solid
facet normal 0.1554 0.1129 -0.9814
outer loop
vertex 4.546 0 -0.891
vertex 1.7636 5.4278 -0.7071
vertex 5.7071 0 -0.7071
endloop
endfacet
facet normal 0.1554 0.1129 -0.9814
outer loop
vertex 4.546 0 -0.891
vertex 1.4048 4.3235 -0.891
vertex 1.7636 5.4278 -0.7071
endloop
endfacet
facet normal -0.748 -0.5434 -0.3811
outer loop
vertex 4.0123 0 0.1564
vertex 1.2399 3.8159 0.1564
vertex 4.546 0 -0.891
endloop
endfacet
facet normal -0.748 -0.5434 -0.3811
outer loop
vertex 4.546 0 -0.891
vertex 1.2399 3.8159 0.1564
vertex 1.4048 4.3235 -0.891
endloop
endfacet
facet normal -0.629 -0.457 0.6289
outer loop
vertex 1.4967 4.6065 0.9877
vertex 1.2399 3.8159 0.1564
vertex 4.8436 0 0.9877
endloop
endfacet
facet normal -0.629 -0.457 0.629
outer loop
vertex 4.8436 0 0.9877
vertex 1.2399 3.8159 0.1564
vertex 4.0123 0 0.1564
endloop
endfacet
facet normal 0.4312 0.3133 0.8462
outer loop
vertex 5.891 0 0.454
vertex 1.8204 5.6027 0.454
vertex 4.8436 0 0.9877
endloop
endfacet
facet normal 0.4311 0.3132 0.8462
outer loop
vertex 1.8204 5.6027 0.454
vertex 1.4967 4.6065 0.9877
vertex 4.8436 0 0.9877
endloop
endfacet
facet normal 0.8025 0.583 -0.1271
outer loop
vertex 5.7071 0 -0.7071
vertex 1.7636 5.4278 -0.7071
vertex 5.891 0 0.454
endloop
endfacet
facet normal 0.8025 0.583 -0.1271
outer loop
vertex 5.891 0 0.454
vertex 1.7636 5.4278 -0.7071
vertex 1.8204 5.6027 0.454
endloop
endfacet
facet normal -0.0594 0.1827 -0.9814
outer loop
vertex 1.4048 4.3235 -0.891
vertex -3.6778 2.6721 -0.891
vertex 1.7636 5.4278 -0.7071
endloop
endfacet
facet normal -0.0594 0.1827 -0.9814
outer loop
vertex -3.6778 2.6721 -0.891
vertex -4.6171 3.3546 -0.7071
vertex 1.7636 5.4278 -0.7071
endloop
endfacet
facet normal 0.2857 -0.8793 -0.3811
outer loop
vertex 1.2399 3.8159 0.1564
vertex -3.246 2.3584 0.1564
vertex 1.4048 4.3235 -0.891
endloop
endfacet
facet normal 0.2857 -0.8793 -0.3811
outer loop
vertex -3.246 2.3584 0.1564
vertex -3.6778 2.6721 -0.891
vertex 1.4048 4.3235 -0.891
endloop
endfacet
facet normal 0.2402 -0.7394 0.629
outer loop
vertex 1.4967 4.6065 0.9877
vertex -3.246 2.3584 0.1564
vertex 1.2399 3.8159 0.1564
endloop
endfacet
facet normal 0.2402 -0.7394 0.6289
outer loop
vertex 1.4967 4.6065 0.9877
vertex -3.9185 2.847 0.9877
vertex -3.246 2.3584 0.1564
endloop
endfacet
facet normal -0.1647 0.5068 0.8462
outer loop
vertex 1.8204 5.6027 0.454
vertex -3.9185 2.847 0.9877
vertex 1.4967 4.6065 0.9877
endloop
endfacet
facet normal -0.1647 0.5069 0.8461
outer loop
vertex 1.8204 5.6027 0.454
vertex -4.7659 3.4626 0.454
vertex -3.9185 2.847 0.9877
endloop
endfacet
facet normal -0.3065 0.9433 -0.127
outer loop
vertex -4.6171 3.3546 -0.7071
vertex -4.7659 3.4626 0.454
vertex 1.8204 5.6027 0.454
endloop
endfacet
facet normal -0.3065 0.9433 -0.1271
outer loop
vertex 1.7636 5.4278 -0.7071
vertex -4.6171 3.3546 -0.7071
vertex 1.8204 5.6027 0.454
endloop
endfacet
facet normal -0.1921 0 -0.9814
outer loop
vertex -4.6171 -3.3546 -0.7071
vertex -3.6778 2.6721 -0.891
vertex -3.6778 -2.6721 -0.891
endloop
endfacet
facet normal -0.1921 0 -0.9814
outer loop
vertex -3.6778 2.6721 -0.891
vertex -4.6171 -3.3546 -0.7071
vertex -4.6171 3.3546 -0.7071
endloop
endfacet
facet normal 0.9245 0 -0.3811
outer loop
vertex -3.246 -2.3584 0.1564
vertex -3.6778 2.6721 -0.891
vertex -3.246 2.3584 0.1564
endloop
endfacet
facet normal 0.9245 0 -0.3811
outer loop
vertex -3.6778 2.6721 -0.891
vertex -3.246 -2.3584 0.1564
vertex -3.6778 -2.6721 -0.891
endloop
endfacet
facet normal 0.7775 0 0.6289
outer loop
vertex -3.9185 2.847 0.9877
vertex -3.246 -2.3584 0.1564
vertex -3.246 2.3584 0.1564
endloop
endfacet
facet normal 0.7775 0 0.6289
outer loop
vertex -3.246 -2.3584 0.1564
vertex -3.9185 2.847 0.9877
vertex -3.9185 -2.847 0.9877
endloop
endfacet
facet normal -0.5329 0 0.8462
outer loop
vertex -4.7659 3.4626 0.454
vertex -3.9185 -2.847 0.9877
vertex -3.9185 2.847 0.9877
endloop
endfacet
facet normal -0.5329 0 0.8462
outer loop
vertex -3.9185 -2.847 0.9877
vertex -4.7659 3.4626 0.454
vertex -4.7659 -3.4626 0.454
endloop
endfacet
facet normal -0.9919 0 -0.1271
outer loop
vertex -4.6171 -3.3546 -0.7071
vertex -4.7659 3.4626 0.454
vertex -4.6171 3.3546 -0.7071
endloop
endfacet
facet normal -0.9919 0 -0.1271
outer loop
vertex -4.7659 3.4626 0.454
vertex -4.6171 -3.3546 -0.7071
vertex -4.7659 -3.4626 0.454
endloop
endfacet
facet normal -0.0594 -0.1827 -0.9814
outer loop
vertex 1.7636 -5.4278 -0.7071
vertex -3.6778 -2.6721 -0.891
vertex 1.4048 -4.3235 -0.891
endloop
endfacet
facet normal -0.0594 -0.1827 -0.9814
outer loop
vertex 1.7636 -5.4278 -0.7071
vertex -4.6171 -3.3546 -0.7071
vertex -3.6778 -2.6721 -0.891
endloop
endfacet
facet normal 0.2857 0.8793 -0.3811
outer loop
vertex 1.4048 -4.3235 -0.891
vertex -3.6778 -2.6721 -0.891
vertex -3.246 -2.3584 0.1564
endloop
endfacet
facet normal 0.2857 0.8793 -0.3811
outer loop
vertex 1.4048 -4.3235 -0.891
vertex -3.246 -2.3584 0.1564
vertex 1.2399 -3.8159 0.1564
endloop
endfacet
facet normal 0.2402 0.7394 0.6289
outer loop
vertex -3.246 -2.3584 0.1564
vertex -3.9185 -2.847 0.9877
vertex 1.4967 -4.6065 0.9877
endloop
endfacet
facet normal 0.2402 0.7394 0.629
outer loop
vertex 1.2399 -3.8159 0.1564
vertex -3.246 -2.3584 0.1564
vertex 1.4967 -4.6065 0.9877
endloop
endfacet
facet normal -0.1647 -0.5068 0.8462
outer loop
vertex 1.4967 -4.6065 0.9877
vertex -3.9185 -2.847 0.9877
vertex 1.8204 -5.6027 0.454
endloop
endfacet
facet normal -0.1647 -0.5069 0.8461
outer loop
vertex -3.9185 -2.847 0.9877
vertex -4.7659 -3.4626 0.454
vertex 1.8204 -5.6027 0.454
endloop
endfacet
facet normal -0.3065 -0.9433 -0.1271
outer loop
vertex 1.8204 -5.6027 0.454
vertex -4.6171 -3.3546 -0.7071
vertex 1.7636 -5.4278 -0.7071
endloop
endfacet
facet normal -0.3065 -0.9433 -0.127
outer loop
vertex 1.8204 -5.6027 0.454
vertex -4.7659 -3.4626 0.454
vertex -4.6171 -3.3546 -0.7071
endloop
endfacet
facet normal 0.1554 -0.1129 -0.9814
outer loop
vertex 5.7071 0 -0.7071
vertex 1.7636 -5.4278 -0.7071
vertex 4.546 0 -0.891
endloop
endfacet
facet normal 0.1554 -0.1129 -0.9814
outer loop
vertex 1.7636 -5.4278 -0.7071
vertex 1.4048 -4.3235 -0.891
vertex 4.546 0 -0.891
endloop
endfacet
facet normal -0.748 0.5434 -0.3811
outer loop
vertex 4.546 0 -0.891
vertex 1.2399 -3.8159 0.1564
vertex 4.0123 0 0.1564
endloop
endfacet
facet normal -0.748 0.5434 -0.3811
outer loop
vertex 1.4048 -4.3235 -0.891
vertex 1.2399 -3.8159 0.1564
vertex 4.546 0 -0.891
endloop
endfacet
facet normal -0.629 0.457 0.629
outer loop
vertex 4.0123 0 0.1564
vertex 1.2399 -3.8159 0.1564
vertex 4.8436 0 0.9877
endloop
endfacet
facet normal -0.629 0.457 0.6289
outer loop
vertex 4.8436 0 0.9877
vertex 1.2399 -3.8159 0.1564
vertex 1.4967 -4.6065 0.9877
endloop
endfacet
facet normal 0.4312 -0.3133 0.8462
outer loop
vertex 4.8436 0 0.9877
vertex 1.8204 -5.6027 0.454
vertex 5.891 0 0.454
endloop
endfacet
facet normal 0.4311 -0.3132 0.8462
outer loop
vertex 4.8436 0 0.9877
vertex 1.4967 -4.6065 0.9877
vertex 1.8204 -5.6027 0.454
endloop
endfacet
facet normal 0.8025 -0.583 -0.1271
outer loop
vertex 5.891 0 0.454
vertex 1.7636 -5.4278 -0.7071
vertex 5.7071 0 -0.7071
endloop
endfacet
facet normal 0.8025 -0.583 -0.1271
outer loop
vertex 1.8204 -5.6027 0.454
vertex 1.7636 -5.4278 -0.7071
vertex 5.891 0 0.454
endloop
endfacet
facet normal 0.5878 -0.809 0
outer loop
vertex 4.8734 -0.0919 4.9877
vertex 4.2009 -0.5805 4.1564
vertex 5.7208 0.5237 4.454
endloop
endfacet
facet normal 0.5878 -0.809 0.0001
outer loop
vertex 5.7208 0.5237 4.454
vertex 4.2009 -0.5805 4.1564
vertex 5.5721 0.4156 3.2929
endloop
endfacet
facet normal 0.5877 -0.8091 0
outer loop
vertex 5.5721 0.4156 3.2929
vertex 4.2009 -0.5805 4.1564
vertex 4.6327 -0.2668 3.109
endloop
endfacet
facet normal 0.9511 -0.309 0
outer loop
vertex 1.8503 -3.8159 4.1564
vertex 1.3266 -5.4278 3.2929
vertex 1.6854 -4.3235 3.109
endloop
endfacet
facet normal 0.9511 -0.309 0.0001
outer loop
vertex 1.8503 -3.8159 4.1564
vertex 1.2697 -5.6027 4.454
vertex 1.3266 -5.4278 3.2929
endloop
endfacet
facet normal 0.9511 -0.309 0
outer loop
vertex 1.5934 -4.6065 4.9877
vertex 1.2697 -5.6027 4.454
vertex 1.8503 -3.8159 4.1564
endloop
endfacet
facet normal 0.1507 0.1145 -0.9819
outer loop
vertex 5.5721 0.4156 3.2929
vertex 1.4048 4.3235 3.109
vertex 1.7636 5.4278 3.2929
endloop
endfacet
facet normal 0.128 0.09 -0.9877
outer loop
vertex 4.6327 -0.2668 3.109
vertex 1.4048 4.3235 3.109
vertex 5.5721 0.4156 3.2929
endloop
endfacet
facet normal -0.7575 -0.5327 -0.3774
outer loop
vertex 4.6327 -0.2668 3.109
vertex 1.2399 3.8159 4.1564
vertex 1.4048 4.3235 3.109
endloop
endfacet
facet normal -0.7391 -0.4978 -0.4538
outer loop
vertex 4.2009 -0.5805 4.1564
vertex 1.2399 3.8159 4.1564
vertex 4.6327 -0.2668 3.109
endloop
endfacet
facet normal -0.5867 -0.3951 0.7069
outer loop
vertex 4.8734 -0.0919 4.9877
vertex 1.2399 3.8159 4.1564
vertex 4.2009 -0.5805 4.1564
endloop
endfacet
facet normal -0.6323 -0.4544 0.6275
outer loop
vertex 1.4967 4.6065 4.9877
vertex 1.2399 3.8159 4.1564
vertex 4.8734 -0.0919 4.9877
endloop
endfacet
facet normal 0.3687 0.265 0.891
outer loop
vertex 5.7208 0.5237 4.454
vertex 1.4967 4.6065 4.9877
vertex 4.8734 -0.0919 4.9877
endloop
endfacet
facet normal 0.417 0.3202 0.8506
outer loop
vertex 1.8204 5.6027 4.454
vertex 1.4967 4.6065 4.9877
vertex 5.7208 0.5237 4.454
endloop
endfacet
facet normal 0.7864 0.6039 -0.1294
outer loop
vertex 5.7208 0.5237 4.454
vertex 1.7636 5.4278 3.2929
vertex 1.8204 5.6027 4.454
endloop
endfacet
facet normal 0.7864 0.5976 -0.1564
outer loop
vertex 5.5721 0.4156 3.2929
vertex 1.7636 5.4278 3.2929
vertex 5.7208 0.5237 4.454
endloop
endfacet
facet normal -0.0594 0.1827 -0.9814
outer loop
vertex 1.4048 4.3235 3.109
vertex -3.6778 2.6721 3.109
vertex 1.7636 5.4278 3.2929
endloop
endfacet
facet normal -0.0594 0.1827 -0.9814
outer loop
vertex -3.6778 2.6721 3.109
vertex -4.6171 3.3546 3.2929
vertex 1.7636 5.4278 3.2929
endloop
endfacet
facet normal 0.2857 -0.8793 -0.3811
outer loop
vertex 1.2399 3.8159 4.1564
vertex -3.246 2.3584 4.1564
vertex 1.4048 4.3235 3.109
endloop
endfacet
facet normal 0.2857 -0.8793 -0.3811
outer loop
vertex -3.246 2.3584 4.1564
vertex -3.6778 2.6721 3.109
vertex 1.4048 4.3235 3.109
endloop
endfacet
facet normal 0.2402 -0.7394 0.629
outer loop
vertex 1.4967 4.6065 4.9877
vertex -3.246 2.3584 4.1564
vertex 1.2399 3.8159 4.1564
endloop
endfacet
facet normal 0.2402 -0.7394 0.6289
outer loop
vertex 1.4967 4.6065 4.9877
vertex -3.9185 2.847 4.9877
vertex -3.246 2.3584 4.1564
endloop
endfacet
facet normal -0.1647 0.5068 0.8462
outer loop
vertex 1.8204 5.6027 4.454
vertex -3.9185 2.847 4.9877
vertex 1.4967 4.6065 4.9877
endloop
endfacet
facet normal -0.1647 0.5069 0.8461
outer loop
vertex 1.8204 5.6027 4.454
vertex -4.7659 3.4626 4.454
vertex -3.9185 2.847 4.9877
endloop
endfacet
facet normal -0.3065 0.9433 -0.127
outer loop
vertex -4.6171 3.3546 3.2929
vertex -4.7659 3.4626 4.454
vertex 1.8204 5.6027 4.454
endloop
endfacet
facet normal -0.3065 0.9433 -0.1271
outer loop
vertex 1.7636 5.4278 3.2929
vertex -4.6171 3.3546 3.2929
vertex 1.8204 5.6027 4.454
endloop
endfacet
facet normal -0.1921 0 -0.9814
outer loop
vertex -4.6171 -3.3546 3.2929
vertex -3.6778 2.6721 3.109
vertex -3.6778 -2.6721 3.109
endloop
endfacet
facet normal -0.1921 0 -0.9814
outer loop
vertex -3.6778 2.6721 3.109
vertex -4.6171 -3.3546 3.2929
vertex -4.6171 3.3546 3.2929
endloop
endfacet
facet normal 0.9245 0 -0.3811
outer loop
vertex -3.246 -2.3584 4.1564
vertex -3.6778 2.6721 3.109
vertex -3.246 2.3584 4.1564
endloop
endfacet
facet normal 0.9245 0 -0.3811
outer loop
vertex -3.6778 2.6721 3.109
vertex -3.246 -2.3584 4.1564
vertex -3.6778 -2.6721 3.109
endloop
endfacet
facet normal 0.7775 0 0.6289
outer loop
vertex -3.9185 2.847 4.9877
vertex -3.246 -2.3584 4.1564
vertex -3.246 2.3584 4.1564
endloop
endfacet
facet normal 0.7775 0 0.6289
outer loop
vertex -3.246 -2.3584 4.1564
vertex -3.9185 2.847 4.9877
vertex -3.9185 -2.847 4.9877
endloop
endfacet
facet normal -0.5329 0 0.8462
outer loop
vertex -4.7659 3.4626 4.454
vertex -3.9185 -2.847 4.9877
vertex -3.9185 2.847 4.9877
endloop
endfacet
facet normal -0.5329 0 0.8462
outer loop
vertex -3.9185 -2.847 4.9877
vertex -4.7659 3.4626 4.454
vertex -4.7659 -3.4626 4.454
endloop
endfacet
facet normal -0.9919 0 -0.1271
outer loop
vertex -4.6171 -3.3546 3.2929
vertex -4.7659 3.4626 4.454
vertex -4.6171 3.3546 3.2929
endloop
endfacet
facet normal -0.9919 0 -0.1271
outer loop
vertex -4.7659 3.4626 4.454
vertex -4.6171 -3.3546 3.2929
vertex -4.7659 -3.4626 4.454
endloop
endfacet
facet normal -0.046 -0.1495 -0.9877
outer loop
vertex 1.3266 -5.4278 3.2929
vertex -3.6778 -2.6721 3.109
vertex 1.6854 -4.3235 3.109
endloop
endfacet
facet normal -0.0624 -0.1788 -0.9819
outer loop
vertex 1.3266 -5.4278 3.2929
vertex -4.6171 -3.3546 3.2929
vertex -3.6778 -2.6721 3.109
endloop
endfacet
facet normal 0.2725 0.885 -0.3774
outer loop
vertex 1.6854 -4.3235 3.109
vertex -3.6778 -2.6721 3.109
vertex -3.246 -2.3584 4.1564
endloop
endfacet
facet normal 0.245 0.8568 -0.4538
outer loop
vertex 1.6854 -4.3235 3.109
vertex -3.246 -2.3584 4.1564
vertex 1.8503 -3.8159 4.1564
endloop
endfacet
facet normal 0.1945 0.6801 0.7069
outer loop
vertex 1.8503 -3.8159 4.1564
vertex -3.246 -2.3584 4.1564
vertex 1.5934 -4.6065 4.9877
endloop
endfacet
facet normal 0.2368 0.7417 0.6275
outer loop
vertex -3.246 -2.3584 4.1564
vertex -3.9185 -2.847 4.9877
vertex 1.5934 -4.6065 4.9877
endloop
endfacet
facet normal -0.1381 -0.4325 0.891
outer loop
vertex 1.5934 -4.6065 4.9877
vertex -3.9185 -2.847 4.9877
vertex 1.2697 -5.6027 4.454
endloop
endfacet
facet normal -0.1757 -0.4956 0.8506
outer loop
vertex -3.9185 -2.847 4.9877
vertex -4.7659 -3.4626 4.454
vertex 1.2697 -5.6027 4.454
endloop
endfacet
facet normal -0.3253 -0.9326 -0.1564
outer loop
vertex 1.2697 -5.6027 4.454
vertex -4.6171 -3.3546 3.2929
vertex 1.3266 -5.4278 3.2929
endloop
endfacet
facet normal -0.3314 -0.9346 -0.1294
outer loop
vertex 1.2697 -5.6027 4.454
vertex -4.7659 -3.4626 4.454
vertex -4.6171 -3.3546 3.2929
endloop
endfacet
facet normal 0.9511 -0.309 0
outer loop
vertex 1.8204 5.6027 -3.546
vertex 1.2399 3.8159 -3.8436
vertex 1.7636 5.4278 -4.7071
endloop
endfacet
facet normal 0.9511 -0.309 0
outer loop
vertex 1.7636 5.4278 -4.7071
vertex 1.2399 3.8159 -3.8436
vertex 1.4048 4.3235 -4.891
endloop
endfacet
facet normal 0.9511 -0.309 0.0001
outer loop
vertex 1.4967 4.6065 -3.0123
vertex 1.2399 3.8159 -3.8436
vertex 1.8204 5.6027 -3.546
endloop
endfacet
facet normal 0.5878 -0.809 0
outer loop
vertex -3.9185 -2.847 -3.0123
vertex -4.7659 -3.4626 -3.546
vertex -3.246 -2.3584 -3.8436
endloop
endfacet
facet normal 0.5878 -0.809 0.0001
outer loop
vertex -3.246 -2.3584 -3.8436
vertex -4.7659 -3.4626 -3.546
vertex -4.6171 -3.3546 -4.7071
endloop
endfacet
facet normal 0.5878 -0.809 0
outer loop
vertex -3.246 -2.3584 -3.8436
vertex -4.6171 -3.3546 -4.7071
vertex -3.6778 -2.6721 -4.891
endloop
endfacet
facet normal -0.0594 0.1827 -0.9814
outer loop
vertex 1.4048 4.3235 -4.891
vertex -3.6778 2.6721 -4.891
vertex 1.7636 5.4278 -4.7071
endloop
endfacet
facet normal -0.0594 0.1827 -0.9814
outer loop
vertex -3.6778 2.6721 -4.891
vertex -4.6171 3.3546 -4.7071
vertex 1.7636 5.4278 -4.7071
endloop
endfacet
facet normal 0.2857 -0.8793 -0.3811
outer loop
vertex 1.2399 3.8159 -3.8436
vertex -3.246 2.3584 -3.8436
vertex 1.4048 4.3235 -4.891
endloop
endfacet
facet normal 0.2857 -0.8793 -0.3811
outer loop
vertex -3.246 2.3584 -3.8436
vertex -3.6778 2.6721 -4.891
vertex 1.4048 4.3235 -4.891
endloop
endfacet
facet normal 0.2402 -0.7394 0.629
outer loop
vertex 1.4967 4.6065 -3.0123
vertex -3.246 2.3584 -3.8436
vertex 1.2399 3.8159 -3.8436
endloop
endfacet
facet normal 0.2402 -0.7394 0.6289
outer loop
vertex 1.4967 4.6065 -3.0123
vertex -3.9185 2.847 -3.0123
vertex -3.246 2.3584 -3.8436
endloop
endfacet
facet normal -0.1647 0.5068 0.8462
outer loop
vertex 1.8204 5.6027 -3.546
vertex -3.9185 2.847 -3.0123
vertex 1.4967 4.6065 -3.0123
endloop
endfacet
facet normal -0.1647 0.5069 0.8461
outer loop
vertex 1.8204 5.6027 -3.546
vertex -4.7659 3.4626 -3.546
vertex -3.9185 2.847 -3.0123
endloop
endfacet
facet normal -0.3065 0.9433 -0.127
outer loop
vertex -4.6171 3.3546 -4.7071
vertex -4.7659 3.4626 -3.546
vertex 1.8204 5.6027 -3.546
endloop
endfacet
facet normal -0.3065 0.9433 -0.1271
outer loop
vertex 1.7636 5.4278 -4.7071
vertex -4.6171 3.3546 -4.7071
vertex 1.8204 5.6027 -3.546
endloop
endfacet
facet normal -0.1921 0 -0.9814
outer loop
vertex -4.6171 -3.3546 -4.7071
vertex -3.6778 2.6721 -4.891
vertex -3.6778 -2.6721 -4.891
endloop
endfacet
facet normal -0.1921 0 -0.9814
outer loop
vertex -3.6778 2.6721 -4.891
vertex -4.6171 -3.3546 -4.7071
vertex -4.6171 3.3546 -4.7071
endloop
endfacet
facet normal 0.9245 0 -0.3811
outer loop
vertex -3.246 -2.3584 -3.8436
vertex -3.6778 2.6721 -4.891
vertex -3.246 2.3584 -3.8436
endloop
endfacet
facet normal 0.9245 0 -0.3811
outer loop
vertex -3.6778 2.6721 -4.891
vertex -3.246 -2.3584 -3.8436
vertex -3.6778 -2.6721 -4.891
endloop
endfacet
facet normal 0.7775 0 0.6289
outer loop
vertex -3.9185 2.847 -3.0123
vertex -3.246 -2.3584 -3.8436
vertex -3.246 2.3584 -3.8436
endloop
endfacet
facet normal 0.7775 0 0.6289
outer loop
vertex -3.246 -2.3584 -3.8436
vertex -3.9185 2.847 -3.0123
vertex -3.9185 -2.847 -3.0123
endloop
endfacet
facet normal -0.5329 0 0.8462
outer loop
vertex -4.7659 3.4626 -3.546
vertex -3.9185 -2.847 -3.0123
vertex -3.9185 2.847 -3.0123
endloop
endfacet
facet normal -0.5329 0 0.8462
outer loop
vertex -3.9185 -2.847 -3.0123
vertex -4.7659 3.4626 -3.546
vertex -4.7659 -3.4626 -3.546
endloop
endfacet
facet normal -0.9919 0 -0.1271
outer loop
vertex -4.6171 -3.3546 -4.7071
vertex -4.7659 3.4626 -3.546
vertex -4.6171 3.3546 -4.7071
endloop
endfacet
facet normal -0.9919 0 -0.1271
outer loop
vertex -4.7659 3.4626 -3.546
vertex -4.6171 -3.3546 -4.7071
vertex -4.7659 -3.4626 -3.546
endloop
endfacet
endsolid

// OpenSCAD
// rotation matrix implementation
// OpenSCAD seems to do this slightly different from Wikipedia
// c.f. https://en.wikipedia.org/wiki/Rotation_matrix#Basic_rotations
function rot2Mat(rotVec, axis) =
    (len(rotVec) == 2) ?
        rot2Mat([rotVec[0], rotVec[1], 0], axis) :
    (axis == "x") ?
        [[1,              0,               0],
         [0, cos(rotVec[0]),  sin(rotVec[0])],
         [0, sin(rotVec[0]), -cos(rotVec[0])]] :
    (axis == "y") ?
        [[ cos(rotVec[1]), 0, sin(rotVec[1])],
         [              0, 1,              0],
         [-sin(rotVec[1]), 0, cos(rotVec[1])]] :
    (axis == "z") ?
        [[ cos(rotVec[2]), sin(rotVec[2]), 0],
         [-sin(rotVec[2]), cos(rotVec[2]), 0],
         [0,              0,               1]] : undef;

// convert point to 3D by setting Z to zero (if not present)
function c3D(tPoints) = 
    (len(tPoints[0]) < 3) ?
        tPoints * [[1,0,0],[0,1,0]] :
        tPoints;

// rotate [2D] points using a specificed XYZ rotation vector
function myRotate(rotation, points) =
    c3D(points) * rot2Mat(rotation, "x")
           * rot2Mat(rotation, "y")
           * rot2Mat(rotation, "z");    
    
// Determine spherical rotation for cartesian coordinates
function rToS(pt) = 
    [-acos((pt[2]) / norm(pt)), 
	 0, 
	 -atan2(pt[0],pt[1])];

// Generate a line between two points in 3D space
module line3D(p1,p2){
  translate((p1+p2)/2)
    rotate(rToS(p1-p2))
       cylinder(r=1, h=norm(p1-p2), center = true, $fn = 3);
}

// Flattens an array down one level (removing the enclosing array)
function flatten(pointArray, done=0, res=[]) =
    (done == len(pointArray)) ?
        res :
        flatten(pointArray=pointArray, done=done+1, 
            res=concat(res,pointArray[done]));

// Creates a polyhedron face
function phFace(pp, tp, base, add=0) =
    [base + add, (base+1) % pp + add,
     (((base+1) % pp) + pp + add) % tp, (base + pp + add) % tp];

function add(vecArg, scArg, res=[]) = 
    (len(res) >= len(vecArg)) ?
        res :
        add(vecArg, scArg, res=concat(res,[vecArg[len(res)]+scArg]));

// Generate an extruded polyhedron from an array of points
// boolean argument "closed" indicates whether to close up the 
// start and end polygon
module makeExtrudedPoly(ex, merge=false, trimEnds=false){
    ps = flatten(ex);
    pp = len(ex[1]); // points in one polygon
    tp = len(ex[1]) * len(ex); // total number of points
    if(!merge && !trimEnds){
        polyhedron(points=ps, faces=concat(
            [[for (i = [pp-1  : -1 :    0]) i]],
            [[for (i = [tp-pp :  1 : tp-1]) i]],
            [for (pt=[0:(len(ex)-2)])
                for(i = [0:pp-1]) phFace(pp,tp,i,pt*pp)],
            [])
        );
    } else if(trimEnds) {
        polyhedron(points=ps, faces=concat(
            [[for (i = [pp*2-1  : -1 :    pp]) i]],
            [[for (i = [tp-pp*2 :  1 : tp-pp-1]) i]],
            [for (pt=[1:(len(ex)-3)])
                for(i = [0:pp-1]) phFace(pp,tp,i,pt*pp)]));
    } else {
        polyhedron(points=ps, faces=
            [for (pt=[0:(len(ex)-1)])
                for(i = [0:pp-1]) phFace(pp,tp,i,pt*pp)]);
    }
}

// Extrude polygon along a path
module path_extrude(points, path, pos=0, merge=false, trimEnds=false, doRotate=true,
                    doScale=false, extruded=[]){
    if((len(points) > 0) && (len(path) > 0) && (len(points[0]) > 1)){
        if(len(extruded) >= (len(path))){
            // extrusion is finished, so construct the object
            //echo(extruded);
            makeExtrudedPoly(extruded, merge=merge, trimEnds=trimEnds);
        } else {
            sPoints = (doScale ? (points*doScale[pos]) : points );
            // generate points from rotating polygon
            if(merge || (pos < (len(path) - 1))){
                if((pos == 0) && (!merge)) {
                    newPts = (doRotate?(myRotate(rToS(path[1] - path[0]),sPoints)):c3D(sPoints));
                    path_extrude(points=points, path=path, pos=pos+1, 
                        merge=merge, trimEnds=trimEnds, doRotate=doRotate, doScale=doScale,
                        extruded=concat(extruded, [add(newPts,path[pos])]));
                } else {
                    newPts = (doRotate?(myRotate(rToS(path[(pos+1) % len(path)] 
                        - path[(pos+len(path)-1) % len(path)]),
                        sPoints)):c3D(sPoints));
                    path_extrude(points=points, path=path, pos=pos+1,
                        merge=merge, trimEnds=trimEnds, doRotate=doRotate, doScale=doScale,
                        extruded=concat(extruded, [add(newPts,path[pos])]));
                }
            } else {
                newPts = (doRotate?(myRotate(rToS(path[pos] - path[pos-1]),sPoints)):c3D(sPoints));
                path_extrude(points=points, path=path, pos=pos+1,
                    merge=merge, trimEnds=trimEnds, doRotate=doRotate, doScale=doScale,
                    extruded=concat(extruded, [add(newPts,path[pos])]));
            }
        }
    }
}

pi=3.14159;

myPoints = [ for(t = [0:72:359]) [cos(t+45),sin(t+45)] ];
myPath = [ for(t = [0:72:359]) 
    [5*cos(t),5*sin(t), 0] ];

path_extrude(points=myPoints, path=myPath, merge=true);

translate([0,0,4]) path_extrude(points=myPoints, path=myPath,
    merge=false);

translate([0,0,-4]) path_extrude(points=myPoints, path=myPath,
    merge=false, trimEnds=true);
